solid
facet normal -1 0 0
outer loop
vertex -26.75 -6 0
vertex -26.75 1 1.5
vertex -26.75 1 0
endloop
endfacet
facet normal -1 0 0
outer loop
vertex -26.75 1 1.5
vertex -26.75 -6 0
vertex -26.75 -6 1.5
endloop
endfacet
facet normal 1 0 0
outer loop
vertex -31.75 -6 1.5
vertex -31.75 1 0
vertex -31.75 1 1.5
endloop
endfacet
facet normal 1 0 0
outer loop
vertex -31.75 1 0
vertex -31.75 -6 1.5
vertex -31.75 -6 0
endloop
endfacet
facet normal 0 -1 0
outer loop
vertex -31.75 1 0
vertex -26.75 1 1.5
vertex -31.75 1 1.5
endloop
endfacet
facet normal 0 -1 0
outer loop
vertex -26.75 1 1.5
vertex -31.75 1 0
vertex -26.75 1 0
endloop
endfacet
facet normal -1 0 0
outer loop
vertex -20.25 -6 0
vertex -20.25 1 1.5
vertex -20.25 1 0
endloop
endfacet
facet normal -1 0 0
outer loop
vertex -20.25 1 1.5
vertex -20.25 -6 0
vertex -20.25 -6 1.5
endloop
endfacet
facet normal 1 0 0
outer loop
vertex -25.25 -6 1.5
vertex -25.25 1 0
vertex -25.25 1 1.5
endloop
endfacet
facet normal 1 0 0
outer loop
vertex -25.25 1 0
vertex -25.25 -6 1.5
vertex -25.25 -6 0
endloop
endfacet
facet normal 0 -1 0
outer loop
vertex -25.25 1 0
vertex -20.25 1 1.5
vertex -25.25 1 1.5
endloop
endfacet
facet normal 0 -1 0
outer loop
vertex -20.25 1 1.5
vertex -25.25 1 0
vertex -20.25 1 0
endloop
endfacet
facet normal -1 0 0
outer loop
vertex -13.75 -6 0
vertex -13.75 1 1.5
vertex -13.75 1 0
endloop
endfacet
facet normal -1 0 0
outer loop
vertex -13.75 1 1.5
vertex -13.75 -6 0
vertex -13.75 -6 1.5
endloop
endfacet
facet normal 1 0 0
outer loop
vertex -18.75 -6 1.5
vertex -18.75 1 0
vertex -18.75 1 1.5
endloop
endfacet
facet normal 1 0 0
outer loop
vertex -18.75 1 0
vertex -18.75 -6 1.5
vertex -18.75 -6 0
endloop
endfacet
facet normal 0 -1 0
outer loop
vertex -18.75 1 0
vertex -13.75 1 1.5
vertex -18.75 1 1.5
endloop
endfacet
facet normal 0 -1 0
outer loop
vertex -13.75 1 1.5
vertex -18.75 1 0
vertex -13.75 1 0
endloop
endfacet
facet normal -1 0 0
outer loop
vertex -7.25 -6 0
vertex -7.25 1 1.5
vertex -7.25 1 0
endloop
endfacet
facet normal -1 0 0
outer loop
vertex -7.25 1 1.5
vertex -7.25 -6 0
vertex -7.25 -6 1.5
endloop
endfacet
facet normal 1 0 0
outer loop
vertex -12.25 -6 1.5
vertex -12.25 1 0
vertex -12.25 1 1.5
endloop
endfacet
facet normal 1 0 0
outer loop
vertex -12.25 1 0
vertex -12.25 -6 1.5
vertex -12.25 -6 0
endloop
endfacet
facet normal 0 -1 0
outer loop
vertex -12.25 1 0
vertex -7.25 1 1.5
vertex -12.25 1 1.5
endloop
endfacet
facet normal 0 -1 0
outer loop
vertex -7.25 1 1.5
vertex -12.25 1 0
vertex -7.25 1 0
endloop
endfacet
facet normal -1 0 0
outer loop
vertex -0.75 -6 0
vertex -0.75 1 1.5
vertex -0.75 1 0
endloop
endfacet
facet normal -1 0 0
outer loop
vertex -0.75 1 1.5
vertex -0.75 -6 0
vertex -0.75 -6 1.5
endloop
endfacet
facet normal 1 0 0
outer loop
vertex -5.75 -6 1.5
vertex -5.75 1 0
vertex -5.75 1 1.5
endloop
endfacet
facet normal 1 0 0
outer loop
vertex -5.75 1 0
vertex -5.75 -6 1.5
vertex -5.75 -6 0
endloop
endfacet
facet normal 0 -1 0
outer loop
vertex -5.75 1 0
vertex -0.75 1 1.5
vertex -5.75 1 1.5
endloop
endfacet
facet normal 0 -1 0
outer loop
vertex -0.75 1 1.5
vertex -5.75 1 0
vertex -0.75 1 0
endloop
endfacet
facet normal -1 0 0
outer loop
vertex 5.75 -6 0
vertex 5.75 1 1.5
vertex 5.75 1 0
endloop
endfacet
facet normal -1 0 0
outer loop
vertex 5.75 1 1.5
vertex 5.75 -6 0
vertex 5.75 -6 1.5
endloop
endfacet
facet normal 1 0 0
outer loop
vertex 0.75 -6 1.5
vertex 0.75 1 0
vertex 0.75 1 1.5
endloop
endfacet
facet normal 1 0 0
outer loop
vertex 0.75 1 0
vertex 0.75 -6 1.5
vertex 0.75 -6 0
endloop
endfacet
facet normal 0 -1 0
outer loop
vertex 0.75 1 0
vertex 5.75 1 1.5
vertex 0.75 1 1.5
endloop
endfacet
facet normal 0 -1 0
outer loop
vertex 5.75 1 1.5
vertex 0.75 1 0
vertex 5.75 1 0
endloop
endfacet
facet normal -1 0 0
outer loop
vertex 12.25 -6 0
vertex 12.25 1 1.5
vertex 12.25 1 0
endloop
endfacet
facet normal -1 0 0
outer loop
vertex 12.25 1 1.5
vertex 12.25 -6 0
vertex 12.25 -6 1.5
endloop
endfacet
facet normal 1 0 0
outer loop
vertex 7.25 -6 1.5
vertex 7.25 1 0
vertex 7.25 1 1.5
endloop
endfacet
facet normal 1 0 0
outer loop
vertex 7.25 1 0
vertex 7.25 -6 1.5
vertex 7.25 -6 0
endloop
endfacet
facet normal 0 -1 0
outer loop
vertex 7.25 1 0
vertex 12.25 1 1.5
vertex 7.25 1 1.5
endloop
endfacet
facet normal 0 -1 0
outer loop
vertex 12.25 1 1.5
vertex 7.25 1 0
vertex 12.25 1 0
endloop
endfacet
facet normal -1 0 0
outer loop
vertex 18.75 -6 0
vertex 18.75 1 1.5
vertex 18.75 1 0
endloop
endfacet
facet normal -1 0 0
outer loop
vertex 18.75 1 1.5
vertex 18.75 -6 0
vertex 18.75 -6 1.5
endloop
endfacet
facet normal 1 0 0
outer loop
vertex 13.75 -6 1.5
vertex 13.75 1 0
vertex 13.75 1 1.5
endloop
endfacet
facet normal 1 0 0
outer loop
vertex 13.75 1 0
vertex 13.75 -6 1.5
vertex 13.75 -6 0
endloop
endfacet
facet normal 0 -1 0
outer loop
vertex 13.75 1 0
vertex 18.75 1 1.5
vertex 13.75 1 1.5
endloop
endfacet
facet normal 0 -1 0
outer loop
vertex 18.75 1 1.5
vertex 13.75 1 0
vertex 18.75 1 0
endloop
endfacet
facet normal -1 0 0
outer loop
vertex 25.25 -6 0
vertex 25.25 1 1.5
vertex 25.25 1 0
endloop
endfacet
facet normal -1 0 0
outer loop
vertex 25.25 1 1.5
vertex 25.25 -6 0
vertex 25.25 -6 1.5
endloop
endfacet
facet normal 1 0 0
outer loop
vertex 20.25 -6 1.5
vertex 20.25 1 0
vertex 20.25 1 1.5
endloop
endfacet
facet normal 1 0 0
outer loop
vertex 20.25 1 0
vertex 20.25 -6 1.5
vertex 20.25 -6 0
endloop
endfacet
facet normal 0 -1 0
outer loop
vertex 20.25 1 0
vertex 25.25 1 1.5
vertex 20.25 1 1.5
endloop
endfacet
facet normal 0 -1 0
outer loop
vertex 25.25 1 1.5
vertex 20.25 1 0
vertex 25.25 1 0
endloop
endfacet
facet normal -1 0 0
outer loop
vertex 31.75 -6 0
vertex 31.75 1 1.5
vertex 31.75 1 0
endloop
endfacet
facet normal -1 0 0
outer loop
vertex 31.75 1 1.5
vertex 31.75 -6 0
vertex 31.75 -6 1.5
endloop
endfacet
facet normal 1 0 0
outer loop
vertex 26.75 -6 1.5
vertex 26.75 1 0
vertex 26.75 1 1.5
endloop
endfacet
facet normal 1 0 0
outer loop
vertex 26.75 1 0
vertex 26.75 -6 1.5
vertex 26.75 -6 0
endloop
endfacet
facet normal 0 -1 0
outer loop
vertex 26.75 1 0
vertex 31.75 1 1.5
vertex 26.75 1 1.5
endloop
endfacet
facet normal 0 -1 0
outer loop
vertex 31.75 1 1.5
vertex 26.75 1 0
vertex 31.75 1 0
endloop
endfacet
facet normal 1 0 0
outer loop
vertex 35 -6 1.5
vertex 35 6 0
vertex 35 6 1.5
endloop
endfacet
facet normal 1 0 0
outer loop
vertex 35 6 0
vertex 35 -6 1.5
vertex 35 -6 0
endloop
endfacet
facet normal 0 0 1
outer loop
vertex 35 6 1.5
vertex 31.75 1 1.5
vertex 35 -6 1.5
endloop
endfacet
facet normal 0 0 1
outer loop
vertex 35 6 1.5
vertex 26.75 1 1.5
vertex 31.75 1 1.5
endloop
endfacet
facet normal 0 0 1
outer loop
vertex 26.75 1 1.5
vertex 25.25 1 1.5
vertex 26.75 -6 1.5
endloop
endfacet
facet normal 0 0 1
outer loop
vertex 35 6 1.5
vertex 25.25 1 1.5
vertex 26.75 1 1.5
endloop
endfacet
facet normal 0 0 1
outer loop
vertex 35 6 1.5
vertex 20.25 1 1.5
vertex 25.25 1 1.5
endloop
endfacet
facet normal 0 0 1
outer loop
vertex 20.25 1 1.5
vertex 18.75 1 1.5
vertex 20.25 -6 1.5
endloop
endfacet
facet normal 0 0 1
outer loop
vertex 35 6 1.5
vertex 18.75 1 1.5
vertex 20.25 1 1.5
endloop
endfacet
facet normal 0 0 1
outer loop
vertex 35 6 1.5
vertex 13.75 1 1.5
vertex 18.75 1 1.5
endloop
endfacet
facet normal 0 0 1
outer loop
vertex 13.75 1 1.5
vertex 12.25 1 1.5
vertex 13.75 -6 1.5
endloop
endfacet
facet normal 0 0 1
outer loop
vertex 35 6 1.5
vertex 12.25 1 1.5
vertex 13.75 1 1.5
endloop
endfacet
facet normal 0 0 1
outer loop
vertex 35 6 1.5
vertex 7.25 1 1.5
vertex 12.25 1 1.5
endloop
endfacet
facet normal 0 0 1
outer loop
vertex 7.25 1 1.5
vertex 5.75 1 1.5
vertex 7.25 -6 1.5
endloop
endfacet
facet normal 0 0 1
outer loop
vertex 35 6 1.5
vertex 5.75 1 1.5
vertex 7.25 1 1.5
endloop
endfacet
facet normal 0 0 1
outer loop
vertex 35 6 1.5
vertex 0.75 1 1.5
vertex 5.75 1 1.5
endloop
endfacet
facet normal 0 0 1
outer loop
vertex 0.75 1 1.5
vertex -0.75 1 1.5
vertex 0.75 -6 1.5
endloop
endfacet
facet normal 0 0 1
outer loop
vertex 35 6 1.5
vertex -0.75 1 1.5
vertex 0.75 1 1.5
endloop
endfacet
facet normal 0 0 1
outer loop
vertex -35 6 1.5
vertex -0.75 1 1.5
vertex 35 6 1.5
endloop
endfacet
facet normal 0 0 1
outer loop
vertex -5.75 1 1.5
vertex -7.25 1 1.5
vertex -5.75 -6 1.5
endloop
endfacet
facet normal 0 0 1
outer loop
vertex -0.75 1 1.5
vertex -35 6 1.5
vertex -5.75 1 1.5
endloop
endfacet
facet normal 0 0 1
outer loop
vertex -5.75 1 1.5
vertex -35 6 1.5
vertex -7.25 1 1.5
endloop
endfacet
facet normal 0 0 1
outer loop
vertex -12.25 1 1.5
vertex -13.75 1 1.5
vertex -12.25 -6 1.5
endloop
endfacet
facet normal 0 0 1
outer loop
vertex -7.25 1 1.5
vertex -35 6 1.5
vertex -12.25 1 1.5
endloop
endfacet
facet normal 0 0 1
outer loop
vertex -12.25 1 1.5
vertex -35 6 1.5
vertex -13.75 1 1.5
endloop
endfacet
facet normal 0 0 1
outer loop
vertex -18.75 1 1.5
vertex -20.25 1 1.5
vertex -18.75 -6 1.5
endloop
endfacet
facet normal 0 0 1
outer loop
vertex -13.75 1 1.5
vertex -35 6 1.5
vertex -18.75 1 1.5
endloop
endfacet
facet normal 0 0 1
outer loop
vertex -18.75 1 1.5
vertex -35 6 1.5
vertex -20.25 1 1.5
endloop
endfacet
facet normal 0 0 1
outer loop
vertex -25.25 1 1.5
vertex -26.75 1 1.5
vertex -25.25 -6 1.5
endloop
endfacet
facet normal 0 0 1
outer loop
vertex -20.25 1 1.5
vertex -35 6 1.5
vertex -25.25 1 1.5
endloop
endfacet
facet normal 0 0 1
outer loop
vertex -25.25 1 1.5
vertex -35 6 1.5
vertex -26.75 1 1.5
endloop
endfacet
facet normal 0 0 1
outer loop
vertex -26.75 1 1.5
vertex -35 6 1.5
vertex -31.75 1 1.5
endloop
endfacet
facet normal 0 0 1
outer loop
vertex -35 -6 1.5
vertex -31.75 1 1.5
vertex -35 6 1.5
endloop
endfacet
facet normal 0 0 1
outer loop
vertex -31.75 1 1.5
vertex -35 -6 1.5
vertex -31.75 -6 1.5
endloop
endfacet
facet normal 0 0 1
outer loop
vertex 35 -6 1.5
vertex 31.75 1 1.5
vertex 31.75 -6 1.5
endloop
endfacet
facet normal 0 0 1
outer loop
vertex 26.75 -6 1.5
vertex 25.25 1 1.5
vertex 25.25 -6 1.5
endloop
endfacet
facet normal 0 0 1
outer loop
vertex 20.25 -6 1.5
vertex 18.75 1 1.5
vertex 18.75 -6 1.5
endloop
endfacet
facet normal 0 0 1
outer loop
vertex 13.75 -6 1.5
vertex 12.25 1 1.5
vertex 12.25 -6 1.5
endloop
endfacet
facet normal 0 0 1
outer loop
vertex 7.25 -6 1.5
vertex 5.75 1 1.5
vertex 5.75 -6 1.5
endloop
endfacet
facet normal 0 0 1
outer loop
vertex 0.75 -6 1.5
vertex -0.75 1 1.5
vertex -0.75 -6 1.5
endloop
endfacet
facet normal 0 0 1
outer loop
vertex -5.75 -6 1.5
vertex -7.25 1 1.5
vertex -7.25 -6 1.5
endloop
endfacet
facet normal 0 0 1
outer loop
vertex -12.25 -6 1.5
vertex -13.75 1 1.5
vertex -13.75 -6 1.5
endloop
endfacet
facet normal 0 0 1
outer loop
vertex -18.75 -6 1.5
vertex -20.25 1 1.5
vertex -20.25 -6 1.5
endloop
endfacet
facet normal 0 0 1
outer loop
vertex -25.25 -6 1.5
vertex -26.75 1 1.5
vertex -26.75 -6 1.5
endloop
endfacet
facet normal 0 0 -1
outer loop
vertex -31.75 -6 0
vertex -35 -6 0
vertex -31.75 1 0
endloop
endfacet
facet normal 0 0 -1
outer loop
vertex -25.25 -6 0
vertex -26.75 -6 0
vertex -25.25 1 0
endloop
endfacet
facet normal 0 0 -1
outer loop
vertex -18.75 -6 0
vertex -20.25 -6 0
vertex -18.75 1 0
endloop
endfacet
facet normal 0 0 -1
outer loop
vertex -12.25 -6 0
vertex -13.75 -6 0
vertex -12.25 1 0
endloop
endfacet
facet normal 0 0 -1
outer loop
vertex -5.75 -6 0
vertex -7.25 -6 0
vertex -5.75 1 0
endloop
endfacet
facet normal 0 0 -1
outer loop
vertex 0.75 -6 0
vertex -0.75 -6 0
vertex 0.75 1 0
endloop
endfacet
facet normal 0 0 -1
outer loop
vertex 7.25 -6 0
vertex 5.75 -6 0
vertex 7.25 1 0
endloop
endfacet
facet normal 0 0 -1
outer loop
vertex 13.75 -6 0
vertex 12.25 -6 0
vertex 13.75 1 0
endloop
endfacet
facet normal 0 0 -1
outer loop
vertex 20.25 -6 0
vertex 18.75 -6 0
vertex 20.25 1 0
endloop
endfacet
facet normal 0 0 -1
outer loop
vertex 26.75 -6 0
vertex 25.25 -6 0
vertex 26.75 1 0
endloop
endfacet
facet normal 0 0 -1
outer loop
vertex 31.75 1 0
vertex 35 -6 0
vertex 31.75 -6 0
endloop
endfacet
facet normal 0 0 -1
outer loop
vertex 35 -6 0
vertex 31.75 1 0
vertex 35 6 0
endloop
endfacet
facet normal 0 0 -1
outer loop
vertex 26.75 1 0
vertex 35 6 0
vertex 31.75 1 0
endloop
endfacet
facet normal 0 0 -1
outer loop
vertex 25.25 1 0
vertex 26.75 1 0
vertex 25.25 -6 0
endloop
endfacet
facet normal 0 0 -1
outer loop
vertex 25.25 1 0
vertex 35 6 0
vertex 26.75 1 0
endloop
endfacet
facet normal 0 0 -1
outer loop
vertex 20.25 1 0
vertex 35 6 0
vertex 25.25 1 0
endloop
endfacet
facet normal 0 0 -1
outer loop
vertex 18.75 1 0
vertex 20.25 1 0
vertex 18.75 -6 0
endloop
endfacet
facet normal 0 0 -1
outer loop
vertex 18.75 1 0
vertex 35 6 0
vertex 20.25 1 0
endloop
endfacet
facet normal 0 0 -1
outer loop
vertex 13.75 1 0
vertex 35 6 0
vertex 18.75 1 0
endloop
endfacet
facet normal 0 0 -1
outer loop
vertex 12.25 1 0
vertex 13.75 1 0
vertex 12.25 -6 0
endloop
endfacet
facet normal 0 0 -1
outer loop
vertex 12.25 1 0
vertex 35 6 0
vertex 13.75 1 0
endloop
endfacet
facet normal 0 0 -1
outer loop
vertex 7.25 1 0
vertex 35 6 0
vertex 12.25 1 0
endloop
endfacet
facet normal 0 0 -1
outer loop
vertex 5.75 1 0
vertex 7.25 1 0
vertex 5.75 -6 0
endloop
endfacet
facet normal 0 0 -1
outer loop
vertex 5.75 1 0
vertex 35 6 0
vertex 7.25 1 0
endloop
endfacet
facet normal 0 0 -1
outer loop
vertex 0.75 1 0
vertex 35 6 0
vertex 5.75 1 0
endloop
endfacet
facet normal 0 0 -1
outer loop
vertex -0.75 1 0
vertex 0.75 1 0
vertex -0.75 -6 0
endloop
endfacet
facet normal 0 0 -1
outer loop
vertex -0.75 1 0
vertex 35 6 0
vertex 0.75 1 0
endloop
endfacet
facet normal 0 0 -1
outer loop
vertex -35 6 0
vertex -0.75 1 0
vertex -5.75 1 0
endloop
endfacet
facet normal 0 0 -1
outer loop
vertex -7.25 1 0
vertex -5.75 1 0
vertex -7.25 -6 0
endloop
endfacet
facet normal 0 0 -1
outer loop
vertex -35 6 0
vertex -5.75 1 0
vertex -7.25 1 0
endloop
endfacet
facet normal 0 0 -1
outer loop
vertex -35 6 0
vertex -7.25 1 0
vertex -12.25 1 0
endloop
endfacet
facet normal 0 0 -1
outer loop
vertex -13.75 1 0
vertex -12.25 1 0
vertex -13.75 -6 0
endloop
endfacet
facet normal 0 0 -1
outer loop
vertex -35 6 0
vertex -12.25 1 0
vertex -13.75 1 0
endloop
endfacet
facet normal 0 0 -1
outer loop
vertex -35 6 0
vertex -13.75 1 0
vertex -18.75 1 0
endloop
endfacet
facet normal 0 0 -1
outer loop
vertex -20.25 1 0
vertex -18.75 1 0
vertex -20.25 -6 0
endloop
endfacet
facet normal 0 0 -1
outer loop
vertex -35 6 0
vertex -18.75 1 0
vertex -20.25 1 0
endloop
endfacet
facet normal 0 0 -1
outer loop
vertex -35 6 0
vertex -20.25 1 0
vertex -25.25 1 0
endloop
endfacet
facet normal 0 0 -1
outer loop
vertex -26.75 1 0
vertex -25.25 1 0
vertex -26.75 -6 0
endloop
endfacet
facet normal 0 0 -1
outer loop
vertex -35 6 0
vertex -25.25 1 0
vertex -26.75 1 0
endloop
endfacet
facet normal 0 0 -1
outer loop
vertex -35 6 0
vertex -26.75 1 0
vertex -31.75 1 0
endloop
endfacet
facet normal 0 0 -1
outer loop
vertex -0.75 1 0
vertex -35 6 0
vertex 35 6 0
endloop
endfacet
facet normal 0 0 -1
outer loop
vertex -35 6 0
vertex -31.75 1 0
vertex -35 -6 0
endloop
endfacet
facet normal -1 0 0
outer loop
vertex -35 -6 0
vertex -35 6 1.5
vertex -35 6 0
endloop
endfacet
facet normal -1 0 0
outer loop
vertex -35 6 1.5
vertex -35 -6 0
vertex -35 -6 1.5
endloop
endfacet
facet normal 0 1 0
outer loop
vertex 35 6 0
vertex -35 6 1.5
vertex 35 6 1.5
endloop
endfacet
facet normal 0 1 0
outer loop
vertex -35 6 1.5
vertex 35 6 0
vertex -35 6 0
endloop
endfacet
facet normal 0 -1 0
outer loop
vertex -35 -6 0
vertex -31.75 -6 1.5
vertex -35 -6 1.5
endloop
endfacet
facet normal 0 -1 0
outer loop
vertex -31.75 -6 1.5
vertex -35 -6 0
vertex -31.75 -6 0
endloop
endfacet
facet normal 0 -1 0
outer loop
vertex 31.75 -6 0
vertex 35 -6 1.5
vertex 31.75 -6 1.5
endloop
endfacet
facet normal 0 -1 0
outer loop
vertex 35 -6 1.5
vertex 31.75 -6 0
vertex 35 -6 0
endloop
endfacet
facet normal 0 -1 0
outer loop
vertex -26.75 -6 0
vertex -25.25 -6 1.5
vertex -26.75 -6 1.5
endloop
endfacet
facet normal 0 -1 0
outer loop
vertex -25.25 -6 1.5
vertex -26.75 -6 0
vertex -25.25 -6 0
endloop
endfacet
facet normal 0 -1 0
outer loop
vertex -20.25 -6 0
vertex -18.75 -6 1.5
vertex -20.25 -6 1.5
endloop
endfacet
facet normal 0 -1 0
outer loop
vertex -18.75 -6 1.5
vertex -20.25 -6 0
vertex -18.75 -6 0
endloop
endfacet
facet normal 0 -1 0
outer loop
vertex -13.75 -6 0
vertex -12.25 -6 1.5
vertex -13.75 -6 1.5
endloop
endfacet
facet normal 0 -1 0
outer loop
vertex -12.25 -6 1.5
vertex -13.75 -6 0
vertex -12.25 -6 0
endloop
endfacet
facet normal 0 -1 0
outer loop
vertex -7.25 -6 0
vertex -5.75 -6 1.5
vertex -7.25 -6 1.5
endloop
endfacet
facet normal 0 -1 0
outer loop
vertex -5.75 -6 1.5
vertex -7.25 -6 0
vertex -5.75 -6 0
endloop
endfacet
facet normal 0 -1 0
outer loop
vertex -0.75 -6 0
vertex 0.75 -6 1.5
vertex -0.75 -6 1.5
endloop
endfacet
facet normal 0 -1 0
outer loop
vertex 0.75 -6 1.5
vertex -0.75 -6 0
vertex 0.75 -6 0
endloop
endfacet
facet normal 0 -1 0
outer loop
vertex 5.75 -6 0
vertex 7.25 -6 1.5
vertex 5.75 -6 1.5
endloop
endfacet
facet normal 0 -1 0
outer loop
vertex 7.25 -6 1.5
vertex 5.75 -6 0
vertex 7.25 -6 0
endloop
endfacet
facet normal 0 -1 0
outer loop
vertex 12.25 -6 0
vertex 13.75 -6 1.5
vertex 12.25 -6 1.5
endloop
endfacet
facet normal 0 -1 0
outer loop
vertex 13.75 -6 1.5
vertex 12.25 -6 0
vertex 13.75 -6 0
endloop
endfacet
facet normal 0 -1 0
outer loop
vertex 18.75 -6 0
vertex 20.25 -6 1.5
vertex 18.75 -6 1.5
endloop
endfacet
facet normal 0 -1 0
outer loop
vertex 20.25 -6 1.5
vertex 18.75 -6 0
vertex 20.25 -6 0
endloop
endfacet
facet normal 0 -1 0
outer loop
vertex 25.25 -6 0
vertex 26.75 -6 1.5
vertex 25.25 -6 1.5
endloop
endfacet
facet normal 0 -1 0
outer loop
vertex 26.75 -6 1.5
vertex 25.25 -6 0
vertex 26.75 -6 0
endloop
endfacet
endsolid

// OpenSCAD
// 10-well agarose gel comb - printed lying flat
// Units: mm

plate_t     = 1.5;   // plate thickness (Z)
spine_len   = 70;    // spine length (X)
spine_w     = 12;    // spine width (Y)
teeth_n     = 10;    // number of teeth
teeth_w     = 5;     // tooth width (X)
teeth_l     = 12;    // tooth length (Y)
gap         = 1.5;   // gap between teeth (X)

pitch       = teeth_w + gap;          // centre-to-centre spacing
x_start     = -(teeth_n - 1) * pitch / 2;  // first tooth centre (row centred)

difference() {
    // Spine
    translate([-spine_len / 2, -spine_w / 2, 0])
        cube([spine_len, spine_w, plate_t]);

    // Teeth, cut into the spine
    for (i = [0 : teeth_n - 1])
        translate([x_start + i * pitch - teeth_w / 2, -teeth_l, -1])
            cube([teeth_w, teeth_l + 1, plate_t + 2]);
}
